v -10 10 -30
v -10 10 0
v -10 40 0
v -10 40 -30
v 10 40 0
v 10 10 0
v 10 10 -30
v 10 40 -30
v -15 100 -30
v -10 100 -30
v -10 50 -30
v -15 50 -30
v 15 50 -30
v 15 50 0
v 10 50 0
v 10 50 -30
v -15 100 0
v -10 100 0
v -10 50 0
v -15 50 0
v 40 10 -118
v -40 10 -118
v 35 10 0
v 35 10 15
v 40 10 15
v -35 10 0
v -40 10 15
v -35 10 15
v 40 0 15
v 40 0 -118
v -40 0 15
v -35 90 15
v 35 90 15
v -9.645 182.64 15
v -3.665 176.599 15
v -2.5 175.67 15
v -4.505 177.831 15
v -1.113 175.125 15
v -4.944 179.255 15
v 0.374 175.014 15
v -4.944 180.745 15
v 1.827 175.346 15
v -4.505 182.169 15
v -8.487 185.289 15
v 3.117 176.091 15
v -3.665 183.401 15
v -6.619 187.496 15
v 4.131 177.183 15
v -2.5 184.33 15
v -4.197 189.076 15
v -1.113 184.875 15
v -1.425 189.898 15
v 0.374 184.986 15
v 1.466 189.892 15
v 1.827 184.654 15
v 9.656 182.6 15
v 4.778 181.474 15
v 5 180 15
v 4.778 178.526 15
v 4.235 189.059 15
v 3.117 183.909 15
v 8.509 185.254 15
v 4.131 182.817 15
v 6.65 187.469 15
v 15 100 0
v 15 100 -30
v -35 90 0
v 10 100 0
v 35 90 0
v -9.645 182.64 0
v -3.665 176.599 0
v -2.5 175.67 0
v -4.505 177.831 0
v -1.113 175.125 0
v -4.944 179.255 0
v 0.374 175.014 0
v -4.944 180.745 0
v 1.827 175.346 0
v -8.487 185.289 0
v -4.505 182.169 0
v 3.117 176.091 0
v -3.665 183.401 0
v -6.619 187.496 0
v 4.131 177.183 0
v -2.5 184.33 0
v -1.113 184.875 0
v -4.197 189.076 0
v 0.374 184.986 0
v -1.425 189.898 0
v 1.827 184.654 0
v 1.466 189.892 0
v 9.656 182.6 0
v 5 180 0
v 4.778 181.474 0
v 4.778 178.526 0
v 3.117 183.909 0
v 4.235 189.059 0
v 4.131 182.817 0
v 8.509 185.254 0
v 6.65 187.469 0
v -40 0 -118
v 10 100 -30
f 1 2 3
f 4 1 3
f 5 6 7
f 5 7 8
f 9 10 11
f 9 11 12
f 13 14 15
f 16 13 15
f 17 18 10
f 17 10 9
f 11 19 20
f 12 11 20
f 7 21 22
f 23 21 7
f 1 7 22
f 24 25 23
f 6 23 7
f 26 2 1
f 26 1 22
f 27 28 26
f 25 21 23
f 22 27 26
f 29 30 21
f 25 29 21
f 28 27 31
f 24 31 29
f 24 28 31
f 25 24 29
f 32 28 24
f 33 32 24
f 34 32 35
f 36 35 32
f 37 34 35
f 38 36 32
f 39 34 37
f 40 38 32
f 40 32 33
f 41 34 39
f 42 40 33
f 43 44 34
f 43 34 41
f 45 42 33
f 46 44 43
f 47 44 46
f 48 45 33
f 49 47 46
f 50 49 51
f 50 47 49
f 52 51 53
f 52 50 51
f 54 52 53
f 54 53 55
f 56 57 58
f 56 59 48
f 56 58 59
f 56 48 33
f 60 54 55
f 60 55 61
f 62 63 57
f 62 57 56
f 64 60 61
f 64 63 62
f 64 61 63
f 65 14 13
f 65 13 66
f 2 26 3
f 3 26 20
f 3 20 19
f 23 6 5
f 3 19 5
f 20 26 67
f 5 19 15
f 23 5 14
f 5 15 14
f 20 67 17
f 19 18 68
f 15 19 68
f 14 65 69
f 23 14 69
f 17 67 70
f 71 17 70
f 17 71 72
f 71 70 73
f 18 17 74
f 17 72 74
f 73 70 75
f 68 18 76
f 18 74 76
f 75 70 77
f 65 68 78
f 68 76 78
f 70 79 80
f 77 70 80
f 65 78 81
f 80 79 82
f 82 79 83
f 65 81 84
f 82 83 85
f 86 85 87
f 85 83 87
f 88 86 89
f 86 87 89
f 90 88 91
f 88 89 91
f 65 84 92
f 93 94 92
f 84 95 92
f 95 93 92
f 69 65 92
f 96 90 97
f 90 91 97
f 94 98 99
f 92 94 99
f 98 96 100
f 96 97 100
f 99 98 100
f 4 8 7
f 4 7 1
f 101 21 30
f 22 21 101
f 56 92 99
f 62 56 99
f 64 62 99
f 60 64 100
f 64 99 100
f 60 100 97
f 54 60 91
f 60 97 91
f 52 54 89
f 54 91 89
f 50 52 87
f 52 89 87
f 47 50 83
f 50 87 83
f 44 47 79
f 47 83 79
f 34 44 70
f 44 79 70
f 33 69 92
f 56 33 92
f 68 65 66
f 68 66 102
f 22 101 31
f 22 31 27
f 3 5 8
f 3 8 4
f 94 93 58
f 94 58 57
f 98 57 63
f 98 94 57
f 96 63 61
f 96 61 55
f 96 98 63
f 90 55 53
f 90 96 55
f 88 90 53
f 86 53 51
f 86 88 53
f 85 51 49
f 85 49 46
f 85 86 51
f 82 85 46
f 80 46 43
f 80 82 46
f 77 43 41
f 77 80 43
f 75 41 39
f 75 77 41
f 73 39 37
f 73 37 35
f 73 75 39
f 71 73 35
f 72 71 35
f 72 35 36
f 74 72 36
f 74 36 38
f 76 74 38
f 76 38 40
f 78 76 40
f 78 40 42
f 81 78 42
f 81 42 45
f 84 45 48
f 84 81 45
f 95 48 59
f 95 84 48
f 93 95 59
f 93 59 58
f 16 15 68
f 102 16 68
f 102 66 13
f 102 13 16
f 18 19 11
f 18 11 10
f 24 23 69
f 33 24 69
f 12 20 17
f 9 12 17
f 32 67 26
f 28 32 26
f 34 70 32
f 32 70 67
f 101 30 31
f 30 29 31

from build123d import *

# Parameters (mm, degrees)
SKETCH1_R           = 5
BOSS_EXTRUDE1_DEPTH = 15
SKETCH2_W           = 80
SKETCH2_H           = 10
BOSS_EXTRUDE2_DEPTH = 118
SKETCH3_W           = 20
SKETCH3_H           = 30
SKETCH3_W_2         = 5
SKETCH3_H_2         = 50
BOSS_EXTRUDE3_DEPTH = 30


with BuildPart() as part:
    # Sketch1 → Boss-Extrude1 (new body)
    with BuildSketch(Plane.XY):
        with BuildLine():
            Line((-40, 10), (-40, 0))
            Line((-40, 0), (40, 0))
            Line((40, 0), (40, 10))
            Line((40, 10), (35, 10))
            Line((35, 10), (35, 90))
            Line((35, 90), (9.656157585, 182.599734734))
            ThreePointArc((9.656157585, 182.599734734), (0.020772469, 189.999978425), (-9.645273695, 182.639828659))
            Line((-9.645273695, 182.639828659), (-35, 90))
            Line((-35, 90), (-35, 10))
            Line((-35, 10), (-40, 10))
        make_face()
        with Locations((0, 180)):
            Circle(SKETCH1_R, mode=Mode.SUBTRACT)
    extrude(amount=BOSS_EXTRUDE1_DEPTH)

    # Sketch2 → Boss-Extrude2 (add)
    with BuildSketch(Plane(origin=(0, 0, 0), x_dir=(-1, 0, 0), z_dir=(0, 0, -1))):
        with Locations((0, 5)):
            Rectangle(SKETCH2_W, SKETCH2_H)
    extrude(amount=BOSS_EXTRUDE2_DEPTH)

    # Sketch3 → Boss-Extrude3 (add)
    with BuildSketch(Plane(origin=(0, 0, 0), x_dir=(-1, 0, 0), z_dir=(0, 0, -1))):
        with Locations((0, 25)):
            Rectangle(SKETCH3_W, SKETCH3_H)
        with Locations((-12.5, 75)):
            Rectangle(SKETCH3_W_2, SKETCH3_H_2)
        with Locations((12.5, 75)):
            Rectangle(SKETCH3_W_2, SKETCH3_H_2)
    extrude(amount=BOSS_EXTRUDE3_DEPTH)


solid = part.part
